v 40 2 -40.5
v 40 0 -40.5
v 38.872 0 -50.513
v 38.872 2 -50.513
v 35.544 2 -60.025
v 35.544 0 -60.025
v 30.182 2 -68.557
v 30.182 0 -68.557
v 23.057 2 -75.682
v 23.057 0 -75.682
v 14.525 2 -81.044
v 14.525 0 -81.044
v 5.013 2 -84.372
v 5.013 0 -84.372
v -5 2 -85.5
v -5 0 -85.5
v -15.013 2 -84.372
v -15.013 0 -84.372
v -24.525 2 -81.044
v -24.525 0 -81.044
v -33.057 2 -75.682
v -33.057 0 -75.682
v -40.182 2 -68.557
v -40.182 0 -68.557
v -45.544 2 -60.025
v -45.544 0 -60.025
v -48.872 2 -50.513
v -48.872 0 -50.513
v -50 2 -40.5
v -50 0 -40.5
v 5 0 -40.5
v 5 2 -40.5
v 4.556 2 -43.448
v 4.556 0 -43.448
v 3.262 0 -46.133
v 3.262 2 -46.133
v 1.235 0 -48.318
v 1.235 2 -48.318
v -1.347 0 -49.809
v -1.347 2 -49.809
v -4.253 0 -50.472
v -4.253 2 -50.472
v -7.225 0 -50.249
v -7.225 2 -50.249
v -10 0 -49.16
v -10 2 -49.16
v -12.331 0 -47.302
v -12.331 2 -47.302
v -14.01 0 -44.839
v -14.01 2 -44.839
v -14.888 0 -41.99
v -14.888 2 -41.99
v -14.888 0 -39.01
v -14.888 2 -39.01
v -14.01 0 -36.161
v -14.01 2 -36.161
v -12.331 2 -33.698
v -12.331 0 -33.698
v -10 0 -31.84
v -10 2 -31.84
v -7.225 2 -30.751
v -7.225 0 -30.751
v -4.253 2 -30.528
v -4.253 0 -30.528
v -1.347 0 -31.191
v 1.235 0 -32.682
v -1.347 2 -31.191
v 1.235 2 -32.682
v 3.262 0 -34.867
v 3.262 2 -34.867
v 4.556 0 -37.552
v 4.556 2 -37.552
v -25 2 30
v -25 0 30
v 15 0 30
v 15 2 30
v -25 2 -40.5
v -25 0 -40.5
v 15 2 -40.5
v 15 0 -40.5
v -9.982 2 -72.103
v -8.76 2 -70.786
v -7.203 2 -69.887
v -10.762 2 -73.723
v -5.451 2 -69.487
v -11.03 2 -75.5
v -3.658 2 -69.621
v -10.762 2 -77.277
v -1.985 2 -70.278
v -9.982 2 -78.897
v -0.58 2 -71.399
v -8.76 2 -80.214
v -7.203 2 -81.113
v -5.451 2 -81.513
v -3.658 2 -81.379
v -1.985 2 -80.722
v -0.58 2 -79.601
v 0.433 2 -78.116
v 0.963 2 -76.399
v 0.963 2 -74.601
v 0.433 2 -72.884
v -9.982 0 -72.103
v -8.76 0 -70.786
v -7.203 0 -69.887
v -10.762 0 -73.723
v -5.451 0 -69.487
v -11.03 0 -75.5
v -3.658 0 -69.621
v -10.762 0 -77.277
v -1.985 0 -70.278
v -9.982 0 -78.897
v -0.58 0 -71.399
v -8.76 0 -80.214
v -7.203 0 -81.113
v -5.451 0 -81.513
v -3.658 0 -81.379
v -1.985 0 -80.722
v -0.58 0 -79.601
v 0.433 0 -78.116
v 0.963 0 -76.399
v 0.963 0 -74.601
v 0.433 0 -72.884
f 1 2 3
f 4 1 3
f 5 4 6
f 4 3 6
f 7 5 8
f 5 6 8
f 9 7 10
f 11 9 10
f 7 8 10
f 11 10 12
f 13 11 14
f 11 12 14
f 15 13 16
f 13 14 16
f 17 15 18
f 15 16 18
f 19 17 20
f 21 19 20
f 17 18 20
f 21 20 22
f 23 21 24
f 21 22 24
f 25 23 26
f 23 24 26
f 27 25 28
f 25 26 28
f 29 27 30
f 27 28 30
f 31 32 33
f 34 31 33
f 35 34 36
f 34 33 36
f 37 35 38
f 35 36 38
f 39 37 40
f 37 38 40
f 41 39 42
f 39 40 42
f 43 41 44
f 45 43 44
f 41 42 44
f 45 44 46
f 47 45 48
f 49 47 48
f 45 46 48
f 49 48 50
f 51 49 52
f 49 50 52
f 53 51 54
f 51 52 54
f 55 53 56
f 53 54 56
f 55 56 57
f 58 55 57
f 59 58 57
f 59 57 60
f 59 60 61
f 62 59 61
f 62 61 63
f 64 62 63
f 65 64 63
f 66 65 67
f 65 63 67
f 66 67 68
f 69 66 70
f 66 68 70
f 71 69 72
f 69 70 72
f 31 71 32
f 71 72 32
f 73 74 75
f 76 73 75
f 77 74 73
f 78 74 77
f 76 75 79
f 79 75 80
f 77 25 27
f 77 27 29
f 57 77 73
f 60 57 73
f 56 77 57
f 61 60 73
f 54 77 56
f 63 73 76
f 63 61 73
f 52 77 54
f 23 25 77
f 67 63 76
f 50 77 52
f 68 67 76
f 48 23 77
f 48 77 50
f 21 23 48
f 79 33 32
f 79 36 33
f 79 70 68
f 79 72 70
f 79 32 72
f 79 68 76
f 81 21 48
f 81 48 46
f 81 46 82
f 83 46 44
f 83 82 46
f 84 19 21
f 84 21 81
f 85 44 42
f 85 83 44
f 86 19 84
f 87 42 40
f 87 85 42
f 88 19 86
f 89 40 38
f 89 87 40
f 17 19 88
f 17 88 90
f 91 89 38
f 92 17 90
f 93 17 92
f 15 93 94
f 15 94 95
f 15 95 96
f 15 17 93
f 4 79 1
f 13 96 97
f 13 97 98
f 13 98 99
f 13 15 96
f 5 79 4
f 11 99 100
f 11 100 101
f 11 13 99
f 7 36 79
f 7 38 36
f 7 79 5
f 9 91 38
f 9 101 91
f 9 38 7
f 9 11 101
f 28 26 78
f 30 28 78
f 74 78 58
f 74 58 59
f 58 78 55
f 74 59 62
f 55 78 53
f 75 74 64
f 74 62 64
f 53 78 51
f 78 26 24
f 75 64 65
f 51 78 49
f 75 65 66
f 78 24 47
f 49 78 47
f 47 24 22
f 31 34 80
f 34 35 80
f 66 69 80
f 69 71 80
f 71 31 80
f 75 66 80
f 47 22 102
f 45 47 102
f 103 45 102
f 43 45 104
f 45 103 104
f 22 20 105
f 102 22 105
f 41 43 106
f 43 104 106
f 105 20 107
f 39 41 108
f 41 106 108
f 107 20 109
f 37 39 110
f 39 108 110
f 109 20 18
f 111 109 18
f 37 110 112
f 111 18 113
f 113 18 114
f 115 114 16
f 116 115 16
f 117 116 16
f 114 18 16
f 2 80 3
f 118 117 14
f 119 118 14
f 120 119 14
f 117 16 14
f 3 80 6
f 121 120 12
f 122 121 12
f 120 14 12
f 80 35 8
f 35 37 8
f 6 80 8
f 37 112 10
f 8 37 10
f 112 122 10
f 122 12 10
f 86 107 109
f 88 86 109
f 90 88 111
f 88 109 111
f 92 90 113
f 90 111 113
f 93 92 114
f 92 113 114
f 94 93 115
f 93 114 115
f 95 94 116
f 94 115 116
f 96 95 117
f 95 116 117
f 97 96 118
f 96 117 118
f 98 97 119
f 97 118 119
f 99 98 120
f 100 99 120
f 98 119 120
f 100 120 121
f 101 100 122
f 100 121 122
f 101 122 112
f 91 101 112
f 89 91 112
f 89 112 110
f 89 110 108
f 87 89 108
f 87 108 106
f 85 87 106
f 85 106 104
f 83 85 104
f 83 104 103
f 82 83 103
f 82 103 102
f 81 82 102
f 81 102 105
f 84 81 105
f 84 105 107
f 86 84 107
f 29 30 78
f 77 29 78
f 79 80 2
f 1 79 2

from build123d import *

# Parameters (mm, degrees)
ESQUISSE1_W             = 40
ESQUISSE1_H             = 70.5
BOSS_EXTRU_1_DEPTH      = 2
ESQUISSE2_R             = 10
ENL_V_MAT_EXTRU_1_DEPTH = 2
ESQUISSE3_R             = 6.03
ENL_V_MAT_EXTRU_2_DEPTH = 10


with BuildPart() as part:
    # Esquisse1 → Boss.-Extru.1 (new body)
    with BuildSketch(Plane(origin=(0, 0, 0), x_dir=(1, 0, 0), z_dir=(0, 1, 0))):
        with Locations((-5, 5.25)):
            Rectangle(ESQUISSE1_W, ESQUISSE1_H)
        with BuildLine():
            Line((-50, 40.5), (40, 40.5))
            ThreePointArc((40, 40.5), (-5, 85.5), (-50, 40.5))
        make_face()
    extrude(amount=BOSS_EXTRU_1_DEPTH)

    # Esquisse2 → Enlèv. mat.-Extru.1 (cut)
    with BuildSketch(Plane(origin=(0, 2, 0), x_dir=(1, 0, 0), z_dir=(0, 1, 0))):
        with Locations((-5, 40.5)):
            Circle(ESQUISSE2_R)
    extrude(amount=-ENL_V_MAT_EXTRU_1_DEPTH, mode=Mode.SUBTRACT)

    # Esquisse3 → Enlèv. mat.-Extru.2 (cut)
    with BuildSketch(Plane(origin=(0, 0, 0), x_dir=(-1, 0, 0), z_dir=(0, -1, 0))):
        with Locations((5, 75.5)):
            Circle(ESQUISSE3_R)
    extrude(amount=-ENL_V_MAT_EXTRU_2_DEPTH, mode=Mode.SUBTRACT)


solid = part.part
